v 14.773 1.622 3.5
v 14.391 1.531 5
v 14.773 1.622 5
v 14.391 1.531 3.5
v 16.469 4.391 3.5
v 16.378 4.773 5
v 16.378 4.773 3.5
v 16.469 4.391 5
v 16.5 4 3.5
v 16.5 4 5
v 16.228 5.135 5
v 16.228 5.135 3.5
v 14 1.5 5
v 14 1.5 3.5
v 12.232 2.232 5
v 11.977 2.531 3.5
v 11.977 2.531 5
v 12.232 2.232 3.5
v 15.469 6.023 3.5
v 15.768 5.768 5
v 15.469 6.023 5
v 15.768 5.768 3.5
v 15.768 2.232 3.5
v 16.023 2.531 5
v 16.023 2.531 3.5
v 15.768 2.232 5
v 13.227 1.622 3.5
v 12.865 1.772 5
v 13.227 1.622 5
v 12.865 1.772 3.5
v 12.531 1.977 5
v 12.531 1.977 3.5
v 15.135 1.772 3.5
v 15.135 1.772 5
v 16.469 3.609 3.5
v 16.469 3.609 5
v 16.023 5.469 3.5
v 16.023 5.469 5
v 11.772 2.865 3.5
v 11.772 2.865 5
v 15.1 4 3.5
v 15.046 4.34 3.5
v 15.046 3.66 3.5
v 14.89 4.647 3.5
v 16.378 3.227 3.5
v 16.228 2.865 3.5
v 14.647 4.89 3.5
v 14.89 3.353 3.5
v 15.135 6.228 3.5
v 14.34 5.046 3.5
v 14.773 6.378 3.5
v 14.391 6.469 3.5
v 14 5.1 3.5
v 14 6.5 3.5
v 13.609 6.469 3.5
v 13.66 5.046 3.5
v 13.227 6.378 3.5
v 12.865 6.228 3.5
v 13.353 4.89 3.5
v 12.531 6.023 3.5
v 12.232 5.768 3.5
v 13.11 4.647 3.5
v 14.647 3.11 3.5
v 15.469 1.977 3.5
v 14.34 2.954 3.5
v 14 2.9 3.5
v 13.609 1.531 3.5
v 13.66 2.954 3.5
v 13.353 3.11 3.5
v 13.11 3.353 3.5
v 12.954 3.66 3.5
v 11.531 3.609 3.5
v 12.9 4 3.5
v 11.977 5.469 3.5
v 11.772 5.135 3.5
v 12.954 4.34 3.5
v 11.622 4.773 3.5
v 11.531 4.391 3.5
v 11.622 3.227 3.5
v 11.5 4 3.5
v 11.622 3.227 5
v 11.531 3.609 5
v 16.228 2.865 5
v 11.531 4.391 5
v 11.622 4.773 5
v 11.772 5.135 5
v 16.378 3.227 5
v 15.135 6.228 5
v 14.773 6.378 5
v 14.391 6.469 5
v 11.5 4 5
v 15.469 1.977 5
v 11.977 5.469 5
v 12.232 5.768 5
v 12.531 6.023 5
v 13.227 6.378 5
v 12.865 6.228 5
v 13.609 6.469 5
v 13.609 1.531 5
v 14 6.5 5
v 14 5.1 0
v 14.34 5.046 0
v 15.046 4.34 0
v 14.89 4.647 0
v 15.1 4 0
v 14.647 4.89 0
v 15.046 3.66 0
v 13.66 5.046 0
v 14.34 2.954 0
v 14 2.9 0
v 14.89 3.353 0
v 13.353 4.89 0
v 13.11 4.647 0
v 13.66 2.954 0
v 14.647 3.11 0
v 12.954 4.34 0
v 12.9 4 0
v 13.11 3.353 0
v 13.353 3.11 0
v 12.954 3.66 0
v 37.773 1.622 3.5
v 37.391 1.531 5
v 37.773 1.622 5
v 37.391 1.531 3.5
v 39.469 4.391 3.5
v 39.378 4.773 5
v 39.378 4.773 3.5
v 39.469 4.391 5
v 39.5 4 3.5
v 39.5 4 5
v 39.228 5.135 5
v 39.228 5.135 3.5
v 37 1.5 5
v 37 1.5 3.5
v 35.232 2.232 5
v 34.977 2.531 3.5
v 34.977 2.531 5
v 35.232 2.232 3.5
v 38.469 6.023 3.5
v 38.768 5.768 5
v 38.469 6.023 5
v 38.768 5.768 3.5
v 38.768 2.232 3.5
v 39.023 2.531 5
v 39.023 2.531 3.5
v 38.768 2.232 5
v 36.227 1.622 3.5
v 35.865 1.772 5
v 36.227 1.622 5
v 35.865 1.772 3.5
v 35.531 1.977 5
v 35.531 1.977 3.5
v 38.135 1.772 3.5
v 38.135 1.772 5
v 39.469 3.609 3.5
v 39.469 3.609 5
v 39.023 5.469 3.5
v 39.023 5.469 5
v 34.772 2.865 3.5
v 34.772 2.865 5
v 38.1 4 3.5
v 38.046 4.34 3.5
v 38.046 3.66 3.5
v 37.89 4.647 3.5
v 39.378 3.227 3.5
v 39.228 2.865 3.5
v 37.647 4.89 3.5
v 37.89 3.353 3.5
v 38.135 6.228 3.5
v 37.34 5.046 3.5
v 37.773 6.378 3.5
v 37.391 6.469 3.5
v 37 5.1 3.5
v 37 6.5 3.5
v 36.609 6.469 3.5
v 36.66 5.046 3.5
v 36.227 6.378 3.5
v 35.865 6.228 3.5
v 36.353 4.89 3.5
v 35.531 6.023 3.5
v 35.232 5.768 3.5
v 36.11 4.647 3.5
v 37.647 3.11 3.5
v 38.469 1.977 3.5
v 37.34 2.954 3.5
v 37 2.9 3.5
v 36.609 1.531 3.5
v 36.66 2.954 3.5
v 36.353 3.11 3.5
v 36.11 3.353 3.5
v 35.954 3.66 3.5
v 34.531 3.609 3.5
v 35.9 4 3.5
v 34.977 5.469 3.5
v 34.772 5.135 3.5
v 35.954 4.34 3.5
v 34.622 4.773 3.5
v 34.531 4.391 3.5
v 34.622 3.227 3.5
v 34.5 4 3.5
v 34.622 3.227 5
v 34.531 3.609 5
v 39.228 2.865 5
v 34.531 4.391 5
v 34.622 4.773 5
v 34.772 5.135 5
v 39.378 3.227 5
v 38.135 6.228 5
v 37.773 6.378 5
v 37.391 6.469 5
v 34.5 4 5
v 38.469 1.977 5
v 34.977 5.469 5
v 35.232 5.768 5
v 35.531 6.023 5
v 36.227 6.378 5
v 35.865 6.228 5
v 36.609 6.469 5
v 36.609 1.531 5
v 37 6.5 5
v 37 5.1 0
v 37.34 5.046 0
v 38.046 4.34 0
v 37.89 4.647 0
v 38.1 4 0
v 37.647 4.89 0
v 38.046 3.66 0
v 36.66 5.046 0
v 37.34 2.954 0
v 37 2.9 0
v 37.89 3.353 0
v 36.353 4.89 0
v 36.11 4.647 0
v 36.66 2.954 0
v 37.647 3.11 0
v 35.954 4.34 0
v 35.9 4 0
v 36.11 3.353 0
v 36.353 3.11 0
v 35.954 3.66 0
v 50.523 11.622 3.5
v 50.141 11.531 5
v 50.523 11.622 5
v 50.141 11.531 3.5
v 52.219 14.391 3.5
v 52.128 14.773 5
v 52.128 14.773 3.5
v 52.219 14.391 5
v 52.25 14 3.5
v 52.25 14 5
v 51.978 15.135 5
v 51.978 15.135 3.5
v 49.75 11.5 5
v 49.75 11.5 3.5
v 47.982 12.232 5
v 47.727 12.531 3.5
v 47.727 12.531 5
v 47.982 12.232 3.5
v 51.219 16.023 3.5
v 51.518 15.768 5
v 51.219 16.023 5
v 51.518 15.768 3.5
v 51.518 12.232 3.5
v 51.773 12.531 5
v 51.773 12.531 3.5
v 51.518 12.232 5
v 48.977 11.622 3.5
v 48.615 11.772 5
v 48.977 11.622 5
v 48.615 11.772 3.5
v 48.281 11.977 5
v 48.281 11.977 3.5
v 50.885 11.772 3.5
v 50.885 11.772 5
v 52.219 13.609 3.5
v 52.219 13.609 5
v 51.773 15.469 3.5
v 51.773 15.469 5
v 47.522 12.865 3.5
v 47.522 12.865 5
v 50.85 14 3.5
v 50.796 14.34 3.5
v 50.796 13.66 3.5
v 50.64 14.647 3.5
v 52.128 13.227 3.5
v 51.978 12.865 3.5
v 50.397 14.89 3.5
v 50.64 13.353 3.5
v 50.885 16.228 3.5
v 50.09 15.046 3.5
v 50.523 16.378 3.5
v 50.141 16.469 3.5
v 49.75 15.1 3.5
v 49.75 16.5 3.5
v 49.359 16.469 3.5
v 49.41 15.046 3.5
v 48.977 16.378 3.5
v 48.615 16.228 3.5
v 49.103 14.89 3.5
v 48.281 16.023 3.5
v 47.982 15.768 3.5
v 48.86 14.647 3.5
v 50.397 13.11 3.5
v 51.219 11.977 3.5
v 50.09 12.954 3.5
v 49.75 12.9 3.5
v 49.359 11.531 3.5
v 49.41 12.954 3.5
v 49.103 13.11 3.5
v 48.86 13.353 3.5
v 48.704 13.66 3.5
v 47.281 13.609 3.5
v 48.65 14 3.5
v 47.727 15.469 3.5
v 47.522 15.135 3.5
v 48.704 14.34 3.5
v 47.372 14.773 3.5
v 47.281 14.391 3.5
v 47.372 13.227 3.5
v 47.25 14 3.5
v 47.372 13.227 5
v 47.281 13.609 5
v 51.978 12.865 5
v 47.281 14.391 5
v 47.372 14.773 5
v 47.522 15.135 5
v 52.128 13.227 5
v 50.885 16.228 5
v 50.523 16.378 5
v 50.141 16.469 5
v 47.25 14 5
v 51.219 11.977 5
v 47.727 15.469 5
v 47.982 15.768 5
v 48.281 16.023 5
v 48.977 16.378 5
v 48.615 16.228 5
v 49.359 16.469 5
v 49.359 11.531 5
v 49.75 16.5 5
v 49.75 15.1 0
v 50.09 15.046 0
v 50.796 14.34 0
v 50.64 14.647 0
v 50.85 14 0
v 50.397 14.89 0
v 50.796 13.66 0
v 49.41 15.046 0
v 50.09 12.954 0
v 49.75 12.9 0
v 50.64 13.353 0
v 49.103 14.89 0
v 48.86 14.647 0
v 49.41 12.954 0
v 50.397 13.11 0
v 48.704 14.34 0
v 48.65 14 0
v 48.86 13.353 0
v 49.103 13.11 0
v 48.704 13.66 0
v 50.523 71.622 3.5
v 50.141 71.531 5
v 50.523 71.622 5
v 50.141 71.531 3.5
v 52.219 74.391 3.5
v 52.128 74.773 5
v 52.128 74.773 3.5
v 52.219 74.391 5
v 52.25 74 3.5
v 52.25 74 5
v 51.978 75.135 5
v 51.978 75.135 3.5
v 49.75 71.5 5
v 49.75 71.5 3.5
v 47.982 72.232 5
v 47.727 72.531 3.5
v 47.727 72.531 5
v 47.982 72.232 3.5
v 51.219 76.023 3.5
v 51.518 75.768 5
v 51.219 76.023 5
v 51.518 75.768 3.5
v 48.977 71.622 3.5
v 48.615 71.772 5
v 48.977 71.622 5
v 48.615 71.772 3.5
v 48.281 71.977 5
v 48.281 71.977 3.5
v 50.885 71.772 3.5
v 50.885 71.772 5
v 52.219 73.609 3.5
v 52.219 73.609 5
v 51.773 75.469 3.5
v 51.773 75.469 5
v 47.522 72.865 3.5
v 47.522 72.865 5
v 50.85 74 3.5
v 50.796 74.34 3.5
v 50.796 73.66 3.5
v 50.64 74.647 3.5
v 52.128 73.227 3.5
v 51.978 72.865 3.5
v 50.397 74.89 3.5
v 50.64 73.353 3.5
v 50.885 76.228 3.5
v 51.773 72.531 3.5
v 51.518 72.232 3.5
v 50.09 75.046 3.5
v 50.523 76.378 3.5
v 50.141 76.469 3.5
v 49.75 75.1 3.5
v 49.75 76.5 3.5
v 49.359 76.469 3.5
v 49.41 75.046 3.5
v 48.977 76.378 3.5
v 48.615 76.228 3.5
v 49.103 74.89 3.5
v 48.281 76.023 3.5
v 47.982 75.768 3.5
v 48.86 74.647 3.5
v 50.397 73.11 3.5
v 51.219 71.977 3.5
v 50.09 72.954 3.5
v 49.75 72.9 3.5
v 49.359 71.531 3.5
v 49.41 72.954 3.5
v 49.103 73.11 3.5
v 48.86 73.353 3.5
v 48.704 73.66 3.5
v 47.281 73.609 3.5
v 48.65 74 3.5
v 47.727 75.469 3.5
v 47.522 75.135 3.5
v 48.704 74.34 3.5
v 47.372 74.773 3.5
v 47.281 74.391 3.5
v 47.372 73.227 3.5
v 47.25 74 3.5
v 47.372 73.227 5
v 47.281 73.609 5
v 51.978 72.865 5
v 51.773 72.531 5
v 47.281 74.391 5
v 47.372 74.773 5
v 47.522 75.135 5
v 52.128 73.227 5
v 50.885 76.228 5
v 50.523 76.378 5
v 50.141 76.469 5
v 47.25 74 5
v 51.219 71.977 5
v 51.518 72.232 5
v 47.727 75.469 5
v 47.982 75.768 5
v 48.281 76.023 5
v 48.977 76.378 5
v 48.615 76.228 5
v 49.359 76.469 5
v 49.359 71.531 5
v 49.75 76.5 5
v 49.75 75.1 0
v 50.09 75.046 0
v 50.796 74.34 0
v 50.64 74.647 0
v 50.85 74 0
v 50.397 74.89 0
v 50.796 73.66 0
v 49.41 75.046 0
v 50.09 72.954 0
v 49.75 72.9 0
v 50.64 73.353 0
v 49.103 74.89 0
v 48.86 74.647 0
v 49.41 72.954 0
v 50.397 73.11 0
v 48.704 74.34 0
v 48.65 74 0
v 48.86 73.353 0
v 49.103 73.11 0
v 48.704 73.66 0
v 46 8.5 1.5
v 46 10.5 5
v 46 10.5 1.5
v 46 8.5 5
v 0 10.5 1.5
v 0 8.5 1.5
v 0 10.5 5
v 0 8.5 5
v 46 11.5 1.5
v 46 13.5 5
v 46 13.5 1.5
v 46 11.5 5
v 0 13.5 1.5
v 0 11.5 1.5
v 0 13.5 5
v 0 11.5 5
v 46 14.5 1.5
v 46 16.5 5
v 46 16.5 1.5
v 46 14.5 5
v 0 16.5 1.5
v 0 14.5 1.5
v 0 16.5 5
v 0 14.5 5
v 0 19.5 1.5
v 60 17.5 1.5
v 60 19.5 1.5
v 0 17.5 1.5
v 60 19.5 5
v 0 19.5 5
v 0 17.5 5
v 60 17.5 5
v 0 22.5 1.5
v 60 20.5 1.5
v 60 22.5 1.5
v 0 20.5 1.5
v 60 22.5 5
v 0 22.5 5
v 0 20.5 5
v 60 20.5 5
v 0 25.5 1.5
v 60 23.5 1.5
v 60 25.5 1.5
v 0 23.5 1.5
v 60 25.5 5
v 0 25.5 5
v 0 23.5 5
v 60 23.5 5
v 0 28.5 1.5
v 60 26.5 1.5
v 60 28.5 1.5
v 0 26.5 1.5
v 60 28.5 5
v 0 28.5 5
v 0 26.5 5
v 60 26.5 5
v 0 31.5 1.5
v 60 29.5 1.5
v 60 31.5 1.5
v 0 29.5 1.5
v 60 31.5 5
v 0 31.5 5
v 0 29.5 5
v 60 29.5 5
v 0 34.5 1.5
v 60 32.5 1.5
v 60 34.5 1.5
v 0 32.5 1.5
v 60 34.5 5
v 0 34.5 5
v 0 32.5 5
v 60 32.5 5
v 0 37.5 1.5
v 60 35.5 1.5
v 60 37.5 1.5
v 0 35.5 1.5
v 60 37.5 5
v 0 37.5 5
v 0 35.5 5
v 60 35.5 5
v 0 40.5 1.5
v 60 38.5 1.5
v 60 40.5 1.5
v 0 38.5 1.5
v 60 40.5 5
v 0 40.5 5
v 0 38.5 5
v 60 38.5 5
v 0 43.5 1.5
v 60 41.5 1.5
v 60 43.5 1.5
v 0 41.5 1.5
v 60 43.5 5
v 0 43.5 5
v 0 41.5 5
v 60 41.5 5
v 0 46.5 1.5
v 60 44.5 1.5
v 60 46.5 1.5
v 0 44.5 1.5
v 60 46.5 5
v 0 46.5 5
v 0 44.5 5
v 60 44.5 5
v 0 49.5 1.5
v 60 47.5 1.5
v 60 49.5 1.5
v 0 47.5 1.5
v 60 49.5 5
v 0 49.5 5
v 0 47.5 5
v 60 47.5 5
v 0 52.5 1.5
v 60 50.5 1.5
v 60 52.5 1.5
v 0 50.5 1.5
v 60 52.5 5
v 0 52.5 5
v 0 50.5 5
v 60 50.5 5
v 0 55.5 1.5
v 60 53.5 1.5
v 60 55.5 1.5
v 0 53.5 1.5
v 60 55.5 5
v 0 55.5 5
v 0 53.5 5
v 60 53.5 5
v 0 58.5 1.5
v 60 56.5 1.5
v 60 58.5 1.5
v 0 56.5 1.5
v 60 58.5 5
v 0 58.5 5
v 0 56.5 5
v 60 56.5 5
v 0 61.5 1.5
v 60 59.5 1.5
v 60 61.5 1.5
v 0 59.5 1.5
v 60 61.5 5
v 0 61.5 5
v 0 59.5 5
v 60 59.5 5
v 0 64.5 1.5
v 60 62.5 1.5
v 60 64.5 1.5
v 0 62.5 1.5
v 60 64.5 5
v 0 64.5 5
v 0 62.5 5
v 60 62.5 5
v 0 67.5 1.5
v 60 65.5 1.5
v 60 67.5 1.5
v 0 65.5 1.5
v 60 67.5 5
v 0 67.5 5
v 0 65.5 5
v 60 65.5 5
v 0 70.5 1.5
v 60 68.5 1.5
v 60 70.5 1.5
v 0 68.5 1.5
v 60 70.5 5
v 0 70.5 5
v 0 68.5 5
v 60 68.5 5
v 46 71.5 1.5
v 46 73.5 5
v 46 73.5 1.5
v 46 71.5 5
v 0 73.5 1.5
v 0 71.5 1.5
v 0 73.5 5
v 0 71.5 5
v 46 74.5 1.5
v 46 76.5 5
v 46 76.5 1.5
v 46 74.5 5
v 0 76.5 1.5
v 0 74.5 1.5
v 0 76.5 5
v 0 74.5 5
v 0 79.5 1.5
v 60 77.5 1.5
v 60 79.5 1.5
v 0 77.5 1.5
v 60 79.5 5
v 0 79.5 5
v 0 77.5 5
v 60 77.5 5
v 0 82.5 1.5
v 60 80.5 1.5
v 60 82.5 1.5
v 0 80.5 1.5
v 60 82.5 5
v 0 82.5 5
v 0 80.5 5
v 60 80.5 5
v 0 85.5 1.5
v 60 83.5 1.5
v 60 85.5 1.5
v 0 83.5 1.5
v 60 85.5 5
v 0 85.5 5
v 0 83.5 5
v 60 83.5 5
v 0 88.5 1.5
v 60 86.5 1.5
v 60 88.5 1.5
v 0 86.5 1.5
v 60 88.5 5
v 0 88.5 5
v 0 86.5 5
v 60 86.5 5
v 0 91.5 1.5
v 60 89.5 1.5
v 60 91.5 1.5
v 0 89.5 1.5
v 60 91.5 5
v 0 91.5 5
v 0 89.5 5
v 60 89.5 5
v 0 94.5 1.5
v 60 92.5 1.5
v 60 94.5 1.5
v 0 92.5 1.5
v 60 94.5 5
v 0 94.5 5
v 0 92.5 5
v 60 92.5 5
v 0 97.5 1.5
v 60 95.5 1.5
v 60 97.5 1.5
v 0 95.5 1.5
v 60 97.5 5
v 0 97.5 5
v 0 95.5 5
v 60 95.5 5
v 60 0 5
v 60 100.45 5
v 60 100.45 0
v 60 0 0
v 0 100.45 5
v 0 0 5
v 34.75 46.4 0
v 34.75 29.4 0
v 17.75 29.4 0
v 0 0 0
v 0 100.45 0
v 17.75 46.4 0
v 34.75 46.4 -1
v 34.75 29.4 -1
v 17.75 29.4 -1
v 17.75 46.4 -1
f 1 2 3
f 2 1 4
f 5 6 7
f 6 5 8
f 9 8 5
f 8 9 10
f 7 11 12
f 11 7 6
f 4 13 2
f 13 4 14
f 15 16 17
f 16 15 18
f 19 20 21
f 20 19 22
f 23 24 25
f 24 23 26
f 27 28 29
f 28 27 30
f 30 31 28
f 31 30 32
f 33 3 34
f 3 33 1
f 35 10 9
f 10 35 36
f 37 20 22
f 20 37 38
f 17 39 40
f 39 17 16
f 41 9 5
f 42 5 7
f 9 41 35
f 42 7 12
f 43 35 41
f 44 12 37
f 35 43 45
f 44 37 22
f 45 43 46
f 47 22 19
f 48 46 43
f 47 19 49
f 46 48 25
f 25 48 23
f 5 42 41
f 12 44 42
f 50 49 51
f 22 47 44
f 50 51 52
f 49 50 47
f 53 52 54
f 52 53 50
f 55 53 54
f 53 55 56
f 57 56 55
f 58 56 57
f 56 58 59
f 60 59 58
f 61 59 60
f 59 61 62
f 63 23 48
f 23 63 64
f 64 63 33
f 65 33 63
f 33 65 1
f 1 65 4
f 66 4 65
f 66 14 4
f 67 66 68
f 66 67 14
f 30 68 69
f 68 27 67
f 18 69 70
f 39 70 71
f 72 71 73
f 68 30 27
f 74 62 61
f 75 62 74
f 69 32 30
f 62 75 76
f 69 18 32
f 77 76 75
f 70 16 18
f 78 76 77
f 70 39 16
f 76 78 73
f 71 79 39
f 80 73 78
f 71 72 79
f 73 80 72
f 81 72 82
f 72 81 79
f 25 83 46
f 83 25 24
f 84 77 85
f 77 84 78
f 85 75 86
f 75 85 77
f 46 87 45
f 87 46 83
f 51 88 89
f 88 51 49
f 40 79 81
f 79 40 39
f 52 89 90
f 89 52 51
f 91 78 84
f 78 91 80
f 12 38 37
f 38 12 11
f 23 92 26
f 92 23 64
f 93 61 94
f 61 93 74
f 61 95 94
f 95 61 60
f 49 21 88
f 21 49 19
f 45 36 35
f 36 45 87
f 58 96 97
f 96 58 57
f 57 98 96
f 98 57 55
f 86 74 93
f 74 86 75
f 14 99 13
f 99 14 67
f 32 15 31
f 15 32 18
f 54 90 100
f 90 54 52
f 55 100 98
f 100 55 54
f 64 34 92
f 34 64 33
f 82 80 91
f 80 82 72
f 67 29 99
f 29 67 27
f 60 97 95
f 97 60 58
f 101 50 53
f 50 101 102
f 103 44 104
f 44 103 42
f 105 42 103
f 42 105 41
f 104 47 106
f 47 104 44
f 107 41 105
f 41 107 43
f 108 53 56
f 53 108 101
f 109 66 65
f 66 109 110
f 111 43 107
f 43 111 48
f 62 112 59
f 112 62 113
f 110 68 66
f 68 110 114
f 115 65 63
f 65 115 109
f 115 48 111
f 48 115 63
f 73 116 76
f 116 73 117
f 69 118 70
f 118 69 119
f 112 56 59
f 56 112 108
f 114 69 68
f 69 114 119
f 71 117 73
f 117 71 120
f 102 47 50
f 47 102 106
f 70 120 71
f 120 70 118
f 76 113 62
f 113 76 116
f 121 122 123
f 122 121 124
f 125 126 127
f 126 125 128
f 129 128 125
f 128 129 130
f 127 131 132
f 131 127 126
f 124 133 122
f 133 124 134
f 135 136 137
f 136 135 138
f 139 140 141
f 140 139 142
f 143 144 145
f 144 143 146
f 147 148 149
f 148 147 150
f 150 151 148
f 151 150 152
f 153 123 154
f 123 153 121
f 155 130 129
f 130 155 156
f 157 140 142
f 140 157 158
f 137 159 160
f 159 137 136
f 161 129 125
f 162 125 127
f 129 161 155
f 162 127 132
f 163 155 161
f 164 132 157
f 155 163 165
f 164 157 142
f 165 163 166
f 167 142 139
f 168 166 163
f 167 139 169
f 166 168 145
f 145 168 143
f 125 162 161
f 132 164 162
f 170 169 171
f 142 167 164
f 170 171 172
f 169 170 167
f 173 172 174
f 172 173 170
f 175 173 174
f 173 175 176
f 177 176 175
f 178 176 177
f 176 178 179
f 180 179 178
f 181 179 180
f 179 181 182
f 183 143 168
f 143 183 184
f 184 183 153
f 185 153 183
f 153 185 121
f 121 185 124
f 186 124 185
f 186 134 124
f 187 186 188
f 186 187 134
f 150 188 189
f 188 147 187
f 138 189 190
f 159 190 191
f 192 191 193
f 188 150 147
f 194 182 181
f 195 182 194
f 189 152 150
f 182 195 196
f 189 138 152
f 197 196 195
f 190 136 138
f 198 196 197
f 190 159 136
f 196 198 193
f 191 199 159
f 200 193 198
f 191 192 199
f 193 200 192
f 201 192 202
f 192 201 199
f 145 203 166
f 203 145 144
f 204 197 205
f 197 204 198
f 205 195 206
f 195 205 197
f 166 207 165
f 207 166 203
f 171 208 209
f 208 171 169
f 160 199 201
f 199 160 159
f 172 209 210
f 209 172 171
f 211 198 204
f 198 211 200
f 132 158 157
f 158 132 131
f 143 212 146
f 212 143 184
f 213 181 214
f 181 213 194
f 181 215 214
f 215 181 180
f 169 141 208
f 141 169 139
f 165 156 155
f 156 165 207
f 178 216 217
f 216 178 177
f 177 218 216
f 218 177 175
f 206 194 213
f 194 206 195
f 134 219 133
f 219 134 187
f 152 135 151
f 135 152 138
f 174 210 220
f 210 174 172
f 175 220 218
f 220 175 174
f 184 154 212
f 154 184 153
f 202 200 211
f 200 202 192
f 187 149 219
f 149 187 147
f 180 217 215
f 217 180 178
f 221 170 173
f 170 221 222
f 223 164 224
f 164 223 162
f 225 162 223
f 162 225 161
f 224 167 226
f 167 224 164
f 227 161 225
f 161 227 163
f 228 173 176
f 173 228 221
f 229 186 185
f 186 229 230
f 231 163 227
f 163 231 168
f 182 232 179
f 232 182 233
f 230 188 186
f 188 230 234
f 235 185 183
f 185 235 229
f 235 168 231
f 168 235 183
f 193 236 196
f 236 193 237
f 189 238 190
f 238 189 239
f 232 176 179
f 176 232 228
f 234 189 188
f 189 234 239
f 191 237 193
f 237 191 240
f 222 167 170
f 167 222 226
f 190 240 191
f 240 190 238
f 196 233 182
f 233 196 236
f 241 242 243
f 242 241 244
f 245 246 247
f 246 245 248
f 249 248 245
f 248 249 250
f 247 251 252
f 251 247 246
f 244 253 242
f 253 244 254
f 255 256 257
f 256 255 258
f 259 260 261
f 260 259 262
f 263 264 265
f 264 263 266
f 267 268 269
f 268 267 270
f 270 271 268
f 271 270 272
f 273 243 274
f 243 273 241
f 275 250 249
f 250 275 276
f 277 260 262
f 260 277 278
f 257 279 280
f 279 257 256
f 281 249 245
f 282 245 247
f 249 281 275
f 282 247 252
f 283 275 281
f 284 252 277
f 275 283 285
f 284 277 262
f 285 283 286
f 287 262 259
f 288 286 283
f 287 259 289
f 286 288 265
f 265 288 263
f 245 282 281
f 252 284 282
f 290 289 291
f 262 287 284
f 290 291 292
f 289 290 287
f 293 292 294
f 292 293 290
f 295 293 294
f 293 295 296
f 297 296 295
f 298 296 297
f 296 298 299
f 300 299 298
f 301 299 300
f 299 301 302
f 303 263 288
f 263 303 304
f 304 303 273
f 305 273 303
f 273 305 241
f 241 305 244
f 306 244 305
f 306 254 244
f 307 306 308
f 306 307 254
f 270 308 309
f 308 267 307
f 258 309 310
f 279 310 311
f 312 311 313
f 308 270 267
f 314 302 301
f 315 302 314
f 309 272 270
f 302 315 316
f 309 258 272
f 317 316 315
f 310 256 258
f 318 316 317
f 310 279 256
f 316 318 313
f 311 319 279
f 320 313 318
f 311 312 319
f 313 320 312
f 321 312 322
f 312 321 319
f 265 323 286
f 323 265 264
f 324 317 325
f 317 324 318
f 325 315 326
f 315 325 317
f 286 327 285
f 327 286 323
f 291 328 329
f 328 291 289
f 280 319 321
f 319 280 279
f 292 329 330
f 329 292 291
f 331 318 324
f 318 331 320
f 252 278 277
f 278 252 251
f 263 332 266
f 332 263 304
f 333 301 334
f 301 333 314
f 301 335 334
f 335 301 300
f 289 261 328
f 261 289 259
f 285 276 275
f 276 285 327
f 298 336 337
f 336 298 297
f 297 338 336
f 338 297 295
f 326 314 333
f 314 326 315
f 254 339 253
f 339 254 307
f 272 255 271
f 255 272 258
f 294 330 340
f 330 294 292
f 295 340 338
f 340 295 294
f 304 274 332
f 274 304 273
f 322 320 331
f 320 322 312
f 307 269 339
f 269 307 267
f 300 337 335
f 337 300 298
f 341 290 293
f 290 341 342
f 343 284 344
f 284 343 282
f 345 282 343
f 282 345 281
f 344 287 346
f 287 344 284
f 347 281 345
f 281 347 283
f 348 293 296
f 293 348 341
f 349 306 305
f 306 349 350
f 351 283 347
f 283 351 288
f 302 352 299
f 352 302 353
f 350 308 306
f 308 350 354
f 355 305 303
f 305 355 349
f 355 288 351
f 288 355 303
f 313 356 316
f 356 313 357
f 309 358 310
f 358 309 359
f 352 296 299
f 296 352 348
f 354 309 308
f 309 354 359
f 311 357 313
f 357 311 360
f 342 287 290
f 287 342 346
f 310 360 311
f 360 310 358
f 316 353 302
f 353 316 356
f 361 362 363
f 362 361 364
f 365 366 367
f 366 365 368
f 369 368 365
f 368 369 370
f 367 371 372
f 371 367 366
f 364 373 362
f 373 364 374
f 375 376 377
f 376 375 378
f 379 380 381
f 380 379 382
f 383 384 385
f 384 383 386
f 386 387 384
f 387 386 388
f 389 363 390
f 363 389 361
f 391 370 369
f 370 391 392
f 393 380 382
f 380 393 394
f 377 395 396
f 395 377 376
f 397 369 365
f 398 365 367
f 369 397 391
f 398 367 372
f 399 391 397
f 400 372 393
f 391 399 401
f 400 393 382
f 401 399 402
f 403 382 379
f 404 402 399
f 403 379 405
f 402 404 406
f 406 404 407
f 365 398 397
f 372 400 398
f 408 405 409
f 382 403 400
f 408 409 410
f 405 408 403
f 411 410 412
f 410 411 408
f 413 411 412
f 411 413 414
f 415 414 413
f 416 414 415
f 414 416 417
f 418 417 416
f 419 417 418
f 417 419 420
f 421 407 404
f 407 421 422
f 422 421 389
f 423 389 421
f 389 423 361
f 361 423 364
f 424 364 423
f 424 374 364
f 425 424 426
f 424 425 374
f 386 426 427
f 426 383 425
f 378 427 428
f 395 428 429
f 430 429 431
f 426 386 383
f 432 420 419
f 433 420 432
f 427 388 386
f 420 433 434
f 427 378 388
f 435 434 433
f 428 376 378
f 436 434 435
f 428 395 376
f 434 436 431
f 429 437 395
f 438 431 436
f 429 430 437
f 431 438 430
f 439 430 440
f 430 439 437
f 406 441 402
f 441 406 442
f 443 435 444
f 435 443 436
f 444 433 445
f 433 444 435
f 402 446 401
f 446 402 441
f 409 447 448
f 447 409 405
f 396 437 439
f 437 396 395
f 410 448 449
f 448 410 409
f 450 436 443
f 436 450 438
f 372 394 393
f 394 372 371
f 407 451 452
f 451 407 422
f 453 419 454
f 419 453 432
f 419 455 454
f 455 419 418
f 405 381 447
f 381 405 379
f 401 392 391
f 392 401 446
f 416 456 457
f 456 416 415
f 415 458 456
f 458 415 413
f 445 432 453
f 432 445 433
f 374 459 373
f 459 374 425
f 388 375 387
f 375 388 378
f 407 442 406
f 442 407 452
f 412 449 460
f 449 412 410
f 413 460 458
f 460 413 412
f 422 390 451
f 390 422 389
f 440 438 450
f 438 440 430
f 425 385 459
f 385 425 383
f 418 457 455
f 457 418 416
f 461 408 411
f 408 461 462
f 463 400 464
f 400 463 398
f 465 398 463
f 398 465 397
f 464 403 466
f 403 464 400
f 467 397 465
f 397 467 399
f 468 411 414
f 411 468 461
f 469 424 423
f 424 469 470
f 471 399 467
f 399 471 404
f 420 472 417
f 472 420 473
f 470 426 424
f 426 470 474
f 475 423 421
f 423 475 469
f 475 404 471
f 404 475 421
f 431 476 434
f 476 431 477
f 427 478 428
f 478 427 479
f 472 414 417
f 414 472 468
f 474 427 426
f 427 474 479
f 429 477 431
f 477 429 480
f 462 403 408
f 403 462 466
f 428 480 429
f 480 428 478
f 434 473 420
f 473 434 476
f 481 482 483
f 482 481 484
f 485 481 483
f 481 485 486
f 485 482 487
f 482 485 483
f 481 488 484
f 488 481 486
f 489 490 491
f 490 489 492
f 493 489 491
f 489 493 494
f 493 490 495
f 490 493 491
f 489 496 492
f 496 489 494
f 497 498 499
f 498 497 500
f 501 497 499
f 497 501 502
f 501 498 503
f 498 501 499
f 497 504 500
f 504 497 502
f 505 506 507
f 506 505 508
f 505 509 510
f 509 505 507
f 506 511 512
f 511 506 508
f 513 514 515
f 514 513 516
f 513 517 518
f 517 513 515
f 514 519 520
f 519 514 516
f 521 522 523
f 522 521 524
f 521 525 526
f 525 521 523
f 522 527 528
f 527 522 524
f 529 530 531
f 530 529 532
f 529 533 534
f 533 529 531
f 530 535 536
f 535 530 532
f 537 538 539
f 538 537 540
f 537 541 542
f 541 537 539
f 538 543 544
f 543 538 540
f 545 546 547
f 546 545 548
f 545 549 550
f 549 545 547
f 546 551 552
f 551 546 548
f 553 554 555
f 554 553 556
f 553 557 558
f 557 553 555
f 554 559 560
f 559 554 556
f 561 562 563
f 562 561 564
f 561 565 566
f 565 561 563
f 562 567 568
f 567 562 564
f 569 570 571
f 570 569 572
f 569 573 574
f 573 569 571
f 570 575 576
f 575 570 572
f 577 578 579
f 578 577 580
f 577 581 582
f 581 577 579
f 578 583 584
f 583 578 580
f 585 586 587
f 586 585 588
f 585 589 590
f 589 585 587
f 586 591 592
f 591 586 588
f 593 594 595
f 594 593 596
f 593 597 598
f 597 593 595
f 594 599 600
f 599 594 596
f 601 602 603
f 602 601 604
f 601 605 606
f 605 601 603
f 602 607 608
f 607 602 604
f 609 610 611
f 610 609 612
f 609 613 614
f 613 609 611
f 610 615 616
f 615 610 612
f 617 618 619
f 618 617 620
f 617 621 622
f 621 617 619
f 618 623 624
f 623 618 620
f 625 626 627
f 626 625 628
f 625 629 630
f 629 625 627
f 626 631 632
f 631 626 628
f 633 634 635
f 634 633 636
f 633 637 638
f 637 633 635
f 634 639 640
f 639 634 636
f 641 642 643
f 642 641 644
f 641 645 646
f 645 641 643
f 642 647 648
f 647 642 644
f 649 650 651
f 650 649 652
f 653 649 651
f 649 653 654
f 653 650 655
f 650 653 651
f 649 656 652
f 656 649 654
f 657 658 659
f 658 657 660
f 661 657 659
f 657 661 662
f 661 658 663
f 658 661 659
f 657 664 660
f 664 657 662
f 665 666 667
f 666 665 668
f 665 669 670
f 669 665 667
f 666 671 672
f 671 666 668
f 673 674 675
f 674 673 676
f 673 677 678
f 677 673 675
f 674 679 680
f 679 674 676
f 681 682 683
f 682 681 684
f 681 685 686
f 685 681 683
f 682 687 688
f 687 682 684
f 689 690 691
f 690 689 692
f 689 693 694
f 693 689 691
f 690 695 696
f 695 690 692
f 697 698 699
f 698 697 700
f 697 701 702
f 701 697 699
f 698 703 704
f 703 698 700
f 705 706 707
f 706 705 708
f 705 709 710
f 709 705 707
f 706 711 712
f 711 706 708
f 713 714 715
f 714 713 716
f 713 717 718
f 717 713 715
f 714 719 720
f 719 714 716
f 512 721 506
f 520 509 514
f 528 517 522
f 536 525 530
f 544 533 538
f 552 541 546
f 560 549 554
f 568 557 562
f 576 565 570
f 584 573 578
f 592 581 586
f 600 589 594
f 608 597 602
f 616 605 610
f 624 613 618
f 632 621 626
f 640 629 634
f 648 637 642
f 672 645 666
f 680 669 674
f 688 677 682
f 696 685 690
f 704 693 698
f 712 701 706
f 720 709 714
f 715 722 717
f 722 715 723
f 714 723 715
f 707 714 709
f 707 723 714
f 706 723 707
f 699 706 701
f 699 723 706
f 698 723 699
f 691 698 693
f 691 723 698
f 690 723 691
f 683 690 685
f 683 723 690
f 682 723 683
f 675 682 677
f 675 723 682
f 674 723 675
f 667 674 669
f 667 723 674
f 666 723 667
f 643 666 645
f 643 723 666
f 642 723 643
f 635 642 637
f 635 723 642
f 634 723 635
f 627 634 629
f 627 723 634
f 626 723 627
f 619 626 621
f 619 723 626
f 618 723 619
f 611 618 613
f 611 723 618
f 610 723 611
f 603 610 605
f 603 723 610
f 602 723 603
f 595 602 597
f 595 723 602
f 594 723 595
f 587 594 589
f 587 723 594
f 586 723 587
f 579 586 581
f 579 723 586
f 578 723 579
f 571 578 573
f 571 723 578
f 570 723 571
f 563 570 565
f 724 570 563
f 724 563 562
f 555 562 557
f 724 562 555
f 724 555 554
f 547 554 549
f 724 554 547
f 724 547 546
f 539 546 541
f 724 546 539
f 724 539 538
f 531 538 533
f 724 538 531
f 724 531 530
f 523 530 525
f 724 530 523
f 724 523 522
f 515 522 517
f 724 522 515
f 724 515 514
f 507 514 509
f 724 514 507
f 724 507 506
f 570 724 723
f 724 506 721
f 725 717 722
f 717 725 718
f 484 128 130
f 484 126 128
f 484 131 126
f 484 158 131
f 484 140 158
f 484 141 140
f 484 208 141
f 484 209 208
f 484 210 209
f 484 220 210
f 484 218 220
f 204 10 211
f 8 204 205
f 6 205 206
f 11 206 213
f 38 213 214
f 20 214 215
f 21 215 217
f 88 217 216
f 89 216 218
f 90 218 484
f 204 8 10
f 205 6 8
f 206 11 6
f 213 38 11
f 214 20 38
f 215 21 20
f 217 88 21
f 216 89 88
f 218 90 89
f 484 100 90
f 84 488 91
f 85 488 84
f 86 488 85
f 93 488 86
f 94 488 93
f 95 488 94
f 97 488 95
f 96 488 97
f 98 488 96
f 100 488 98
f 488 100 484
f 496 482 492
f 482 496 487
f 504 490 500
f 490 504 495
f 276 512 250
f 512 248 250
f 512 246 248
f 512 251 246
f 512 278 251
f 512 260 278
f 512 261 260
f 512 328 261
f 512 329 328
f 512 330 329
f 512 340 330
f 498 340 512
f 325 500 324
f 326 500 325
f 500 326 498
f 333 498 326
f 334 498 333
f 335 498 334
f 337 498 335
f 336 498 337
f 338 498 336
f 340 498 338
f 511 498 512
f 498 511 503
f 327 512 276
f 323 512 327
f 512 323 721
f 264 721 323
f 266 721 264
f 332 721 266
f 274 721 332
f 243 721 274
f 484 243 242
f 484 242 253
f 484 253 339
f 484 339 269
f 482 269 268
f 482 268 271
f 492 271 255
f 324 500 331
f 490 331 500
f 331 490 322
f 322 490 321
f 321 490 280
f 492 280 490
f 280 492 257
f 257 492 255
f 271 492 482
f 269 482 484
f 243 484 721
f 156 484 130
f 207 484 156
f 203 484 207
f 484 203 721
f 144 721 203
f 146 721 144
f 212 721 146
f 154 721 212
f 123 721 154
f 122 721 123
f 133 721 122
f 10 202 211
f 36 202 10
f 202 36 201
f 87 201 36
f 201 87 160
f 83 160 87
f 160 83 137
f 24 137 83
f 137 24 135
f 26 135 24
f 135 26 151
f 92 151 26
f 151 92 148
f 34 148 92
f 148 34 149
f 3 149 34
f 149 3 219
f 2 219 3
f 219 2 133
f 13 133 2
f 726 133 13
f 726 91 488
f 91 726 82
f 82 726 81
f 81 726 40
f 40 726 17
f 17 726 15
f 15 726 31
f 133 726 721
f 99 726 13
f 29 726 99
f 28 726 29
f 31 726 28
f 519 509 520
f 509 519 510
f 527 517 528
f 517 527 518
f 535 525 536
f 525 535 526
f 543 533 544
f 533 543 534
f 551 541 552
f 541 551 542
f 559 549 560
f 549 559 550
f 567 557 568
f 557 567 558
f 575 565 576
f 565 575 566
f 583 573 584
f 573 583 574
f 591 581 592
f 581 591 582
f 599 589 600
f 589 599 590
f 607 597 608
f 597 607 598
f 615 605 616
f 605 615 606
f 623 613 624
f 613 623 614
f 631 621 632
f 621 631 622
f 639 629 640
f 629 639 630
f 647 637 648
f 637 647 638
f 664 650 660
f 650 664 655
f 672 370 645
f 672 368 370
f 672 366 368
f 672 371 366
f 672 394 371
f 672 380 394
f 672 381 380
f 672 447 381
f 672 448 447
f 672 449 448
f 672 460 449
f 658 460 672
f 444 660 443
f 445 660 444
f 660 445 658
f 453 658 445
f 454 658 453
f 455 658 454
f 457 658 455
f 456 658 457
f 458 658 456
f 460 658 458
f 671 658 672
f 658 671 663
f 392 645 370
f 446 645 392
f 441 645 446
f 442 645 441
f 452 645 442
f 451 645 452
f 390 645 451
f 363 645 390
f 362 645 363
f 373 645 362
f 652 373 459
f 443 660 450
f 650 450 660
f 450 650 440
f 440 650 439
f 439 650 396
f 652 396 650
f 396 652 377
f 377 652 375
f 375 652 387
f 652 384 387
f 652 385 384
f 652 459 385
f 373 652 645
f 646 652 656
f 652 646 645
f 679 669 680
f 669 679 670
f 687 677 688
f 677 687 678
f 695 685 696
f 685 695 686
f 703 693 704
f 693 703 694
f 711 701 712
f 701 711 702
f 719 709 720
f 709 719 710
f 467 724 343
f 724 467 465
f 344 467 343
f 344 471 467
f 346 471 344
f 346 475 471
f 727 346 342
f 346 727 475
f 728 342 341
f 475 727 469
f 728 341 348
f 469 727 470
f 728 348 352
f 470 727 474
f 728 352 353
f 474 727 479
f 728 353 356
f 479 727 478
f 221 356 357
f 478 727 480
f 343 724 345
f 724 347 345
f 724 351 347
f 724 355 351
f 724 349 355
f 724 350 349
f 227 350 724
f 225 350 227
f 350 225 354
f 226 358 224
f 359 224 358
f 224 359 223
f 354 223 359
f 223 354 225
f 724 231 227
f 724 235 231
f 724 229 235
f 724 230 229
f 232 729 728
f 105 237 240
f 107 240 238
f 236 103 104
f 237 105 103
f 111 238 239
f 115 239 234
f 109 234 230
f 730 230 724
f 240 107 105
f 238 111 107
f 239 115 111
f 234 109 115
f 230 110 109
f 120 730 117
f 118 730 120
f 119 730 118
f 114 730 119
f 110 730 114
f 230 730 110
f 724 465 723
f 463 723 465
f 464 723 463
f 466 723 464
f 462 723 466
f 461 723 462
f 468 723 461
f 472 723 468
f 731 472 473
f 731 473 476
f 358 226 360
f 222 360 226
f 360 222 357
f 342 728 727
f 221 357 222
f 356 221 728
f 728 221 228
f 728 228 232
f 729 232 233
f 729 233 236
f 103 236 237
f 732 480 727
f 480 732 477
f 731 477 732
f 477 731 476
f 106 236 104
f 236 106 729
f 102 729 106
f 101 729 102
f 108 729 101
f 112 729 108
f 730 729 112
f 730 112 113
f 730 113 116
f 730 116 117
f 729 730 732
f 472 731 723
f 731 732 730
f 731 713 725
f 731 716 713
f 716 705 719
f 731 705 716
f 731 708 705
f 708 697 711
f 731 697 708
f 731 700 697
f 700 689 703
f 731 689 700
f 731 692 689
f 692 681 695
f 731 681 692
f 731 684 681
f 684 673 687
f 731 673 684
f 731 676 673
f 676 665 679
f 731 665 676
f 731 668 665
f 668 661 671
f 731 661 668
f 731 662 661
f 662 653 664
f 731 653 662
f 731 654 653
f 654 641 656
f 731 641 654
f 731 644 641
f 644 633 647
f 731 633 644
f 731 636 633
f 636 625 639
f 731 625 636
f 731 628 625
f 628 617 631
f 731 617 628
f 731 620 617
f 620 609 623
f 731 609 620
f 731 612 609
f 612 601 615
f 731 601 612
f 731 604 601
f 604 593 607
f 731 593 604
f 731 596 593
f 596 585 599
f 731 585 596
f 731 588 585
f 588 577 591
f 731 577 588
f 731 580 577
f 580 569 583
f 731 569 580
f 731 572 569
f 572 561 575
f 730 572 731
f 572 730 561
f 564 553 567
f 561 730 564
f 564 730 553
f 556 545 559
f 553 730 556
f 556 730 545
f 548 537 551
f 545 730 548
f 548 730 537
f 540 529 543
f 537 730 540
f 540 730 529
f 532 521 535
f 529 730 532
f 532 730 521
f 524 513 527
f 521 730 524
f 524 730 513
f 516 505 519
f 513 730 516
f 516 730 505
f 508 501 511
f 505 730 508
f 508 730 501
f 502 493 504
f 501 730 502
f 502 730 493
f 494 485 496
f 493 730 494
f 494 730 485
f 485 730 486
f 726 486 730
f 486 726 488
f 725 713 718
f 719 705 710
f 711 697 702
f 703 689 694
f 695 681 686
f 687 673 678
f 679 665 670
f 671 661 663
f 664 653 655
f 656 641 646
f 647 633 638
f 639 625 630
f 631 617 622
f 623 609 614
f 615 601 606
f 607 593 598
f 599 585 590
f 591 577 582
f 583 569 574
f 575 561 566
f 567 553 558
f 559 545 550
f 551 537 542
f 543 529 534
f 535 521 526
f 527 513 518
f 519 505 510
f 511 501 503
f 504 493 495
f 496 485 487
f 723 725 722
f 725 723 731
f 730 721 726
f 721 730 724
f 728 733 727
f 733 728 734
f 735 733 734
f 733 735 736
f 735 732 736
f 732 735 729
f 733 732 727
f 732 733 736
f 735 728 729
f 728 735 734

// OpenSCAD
// for MNT Reform 2.0 R-2
 
x1 = 6+8;
y1 = 4;

x2 = x1+23;
y2 = y1+10;

x3 = x2+12.75;
y3 = y2+60;

sink_width = 60;
sink_height = 5;
sink_depth = 25+y3+1.45;

fins_y = 20.5;
fin_width = sink_width+2;
fin_thickness = 2;
fin_spacing = 3;
fin_depth = sink_height-1.5;

module screw_hole(x,y,height) {
  shh=3;
  translate([x,y,height])   cylinder(h=shh, r=5/2, center = true, $fn=40);
  translate([x,y,height/2]) cylinder(h=height+1, r=2.2/2, center = true, $fn=20);
}

union() {
difference() {
  cube([sink_width,sink_depth,sink_height]);
  
  screw_hole(x1,y1,sink_height);
  screw_hole(x2,y1,sink_height);
  screw_hole(x3,y2,sink_height);
  screw_hole(x3,y3,sink_height);
  
  for (i = [-4 : -2]) {
    translate([-1,fins_y+i*fin_spacing,sink_height-fin_depth]) cube([fin_width-15,fin_thickness,fin_depth+1]);
  }
  
  for (i = [-1 : 16]) {
    translate([-1,fins_y+i*fin_spacing,sink_height-fin_depth]) cube([fin_width,fin_thickness,fin_depth+1]);
  }
  
  for (i = [17 : 18]) {
    translate([-1,fins_y+i*fin_spacing,sink_height-fin_depth]) cube([fin_width-15,fin_thickness,fin_depth+1]);
  }
  
  for (i = [19 : 25]) {
    translate([-1,fins_y+i*fin_spacing,sink_height-fin_depth]) cube([fin_width,fin_thickness,fin_depth+1]);
  }
  
  //translate([42.5,1.5,6.5]) linear_extrude(height = 2, center = true, convexity = 10) scale(0.12) import(file = "mnt.svg");
}

// cpu contact pad
translate([x3-17-15,y2+18.6-3.2,-1]) color([1,0,0]) cube([17,17,1]);
}
